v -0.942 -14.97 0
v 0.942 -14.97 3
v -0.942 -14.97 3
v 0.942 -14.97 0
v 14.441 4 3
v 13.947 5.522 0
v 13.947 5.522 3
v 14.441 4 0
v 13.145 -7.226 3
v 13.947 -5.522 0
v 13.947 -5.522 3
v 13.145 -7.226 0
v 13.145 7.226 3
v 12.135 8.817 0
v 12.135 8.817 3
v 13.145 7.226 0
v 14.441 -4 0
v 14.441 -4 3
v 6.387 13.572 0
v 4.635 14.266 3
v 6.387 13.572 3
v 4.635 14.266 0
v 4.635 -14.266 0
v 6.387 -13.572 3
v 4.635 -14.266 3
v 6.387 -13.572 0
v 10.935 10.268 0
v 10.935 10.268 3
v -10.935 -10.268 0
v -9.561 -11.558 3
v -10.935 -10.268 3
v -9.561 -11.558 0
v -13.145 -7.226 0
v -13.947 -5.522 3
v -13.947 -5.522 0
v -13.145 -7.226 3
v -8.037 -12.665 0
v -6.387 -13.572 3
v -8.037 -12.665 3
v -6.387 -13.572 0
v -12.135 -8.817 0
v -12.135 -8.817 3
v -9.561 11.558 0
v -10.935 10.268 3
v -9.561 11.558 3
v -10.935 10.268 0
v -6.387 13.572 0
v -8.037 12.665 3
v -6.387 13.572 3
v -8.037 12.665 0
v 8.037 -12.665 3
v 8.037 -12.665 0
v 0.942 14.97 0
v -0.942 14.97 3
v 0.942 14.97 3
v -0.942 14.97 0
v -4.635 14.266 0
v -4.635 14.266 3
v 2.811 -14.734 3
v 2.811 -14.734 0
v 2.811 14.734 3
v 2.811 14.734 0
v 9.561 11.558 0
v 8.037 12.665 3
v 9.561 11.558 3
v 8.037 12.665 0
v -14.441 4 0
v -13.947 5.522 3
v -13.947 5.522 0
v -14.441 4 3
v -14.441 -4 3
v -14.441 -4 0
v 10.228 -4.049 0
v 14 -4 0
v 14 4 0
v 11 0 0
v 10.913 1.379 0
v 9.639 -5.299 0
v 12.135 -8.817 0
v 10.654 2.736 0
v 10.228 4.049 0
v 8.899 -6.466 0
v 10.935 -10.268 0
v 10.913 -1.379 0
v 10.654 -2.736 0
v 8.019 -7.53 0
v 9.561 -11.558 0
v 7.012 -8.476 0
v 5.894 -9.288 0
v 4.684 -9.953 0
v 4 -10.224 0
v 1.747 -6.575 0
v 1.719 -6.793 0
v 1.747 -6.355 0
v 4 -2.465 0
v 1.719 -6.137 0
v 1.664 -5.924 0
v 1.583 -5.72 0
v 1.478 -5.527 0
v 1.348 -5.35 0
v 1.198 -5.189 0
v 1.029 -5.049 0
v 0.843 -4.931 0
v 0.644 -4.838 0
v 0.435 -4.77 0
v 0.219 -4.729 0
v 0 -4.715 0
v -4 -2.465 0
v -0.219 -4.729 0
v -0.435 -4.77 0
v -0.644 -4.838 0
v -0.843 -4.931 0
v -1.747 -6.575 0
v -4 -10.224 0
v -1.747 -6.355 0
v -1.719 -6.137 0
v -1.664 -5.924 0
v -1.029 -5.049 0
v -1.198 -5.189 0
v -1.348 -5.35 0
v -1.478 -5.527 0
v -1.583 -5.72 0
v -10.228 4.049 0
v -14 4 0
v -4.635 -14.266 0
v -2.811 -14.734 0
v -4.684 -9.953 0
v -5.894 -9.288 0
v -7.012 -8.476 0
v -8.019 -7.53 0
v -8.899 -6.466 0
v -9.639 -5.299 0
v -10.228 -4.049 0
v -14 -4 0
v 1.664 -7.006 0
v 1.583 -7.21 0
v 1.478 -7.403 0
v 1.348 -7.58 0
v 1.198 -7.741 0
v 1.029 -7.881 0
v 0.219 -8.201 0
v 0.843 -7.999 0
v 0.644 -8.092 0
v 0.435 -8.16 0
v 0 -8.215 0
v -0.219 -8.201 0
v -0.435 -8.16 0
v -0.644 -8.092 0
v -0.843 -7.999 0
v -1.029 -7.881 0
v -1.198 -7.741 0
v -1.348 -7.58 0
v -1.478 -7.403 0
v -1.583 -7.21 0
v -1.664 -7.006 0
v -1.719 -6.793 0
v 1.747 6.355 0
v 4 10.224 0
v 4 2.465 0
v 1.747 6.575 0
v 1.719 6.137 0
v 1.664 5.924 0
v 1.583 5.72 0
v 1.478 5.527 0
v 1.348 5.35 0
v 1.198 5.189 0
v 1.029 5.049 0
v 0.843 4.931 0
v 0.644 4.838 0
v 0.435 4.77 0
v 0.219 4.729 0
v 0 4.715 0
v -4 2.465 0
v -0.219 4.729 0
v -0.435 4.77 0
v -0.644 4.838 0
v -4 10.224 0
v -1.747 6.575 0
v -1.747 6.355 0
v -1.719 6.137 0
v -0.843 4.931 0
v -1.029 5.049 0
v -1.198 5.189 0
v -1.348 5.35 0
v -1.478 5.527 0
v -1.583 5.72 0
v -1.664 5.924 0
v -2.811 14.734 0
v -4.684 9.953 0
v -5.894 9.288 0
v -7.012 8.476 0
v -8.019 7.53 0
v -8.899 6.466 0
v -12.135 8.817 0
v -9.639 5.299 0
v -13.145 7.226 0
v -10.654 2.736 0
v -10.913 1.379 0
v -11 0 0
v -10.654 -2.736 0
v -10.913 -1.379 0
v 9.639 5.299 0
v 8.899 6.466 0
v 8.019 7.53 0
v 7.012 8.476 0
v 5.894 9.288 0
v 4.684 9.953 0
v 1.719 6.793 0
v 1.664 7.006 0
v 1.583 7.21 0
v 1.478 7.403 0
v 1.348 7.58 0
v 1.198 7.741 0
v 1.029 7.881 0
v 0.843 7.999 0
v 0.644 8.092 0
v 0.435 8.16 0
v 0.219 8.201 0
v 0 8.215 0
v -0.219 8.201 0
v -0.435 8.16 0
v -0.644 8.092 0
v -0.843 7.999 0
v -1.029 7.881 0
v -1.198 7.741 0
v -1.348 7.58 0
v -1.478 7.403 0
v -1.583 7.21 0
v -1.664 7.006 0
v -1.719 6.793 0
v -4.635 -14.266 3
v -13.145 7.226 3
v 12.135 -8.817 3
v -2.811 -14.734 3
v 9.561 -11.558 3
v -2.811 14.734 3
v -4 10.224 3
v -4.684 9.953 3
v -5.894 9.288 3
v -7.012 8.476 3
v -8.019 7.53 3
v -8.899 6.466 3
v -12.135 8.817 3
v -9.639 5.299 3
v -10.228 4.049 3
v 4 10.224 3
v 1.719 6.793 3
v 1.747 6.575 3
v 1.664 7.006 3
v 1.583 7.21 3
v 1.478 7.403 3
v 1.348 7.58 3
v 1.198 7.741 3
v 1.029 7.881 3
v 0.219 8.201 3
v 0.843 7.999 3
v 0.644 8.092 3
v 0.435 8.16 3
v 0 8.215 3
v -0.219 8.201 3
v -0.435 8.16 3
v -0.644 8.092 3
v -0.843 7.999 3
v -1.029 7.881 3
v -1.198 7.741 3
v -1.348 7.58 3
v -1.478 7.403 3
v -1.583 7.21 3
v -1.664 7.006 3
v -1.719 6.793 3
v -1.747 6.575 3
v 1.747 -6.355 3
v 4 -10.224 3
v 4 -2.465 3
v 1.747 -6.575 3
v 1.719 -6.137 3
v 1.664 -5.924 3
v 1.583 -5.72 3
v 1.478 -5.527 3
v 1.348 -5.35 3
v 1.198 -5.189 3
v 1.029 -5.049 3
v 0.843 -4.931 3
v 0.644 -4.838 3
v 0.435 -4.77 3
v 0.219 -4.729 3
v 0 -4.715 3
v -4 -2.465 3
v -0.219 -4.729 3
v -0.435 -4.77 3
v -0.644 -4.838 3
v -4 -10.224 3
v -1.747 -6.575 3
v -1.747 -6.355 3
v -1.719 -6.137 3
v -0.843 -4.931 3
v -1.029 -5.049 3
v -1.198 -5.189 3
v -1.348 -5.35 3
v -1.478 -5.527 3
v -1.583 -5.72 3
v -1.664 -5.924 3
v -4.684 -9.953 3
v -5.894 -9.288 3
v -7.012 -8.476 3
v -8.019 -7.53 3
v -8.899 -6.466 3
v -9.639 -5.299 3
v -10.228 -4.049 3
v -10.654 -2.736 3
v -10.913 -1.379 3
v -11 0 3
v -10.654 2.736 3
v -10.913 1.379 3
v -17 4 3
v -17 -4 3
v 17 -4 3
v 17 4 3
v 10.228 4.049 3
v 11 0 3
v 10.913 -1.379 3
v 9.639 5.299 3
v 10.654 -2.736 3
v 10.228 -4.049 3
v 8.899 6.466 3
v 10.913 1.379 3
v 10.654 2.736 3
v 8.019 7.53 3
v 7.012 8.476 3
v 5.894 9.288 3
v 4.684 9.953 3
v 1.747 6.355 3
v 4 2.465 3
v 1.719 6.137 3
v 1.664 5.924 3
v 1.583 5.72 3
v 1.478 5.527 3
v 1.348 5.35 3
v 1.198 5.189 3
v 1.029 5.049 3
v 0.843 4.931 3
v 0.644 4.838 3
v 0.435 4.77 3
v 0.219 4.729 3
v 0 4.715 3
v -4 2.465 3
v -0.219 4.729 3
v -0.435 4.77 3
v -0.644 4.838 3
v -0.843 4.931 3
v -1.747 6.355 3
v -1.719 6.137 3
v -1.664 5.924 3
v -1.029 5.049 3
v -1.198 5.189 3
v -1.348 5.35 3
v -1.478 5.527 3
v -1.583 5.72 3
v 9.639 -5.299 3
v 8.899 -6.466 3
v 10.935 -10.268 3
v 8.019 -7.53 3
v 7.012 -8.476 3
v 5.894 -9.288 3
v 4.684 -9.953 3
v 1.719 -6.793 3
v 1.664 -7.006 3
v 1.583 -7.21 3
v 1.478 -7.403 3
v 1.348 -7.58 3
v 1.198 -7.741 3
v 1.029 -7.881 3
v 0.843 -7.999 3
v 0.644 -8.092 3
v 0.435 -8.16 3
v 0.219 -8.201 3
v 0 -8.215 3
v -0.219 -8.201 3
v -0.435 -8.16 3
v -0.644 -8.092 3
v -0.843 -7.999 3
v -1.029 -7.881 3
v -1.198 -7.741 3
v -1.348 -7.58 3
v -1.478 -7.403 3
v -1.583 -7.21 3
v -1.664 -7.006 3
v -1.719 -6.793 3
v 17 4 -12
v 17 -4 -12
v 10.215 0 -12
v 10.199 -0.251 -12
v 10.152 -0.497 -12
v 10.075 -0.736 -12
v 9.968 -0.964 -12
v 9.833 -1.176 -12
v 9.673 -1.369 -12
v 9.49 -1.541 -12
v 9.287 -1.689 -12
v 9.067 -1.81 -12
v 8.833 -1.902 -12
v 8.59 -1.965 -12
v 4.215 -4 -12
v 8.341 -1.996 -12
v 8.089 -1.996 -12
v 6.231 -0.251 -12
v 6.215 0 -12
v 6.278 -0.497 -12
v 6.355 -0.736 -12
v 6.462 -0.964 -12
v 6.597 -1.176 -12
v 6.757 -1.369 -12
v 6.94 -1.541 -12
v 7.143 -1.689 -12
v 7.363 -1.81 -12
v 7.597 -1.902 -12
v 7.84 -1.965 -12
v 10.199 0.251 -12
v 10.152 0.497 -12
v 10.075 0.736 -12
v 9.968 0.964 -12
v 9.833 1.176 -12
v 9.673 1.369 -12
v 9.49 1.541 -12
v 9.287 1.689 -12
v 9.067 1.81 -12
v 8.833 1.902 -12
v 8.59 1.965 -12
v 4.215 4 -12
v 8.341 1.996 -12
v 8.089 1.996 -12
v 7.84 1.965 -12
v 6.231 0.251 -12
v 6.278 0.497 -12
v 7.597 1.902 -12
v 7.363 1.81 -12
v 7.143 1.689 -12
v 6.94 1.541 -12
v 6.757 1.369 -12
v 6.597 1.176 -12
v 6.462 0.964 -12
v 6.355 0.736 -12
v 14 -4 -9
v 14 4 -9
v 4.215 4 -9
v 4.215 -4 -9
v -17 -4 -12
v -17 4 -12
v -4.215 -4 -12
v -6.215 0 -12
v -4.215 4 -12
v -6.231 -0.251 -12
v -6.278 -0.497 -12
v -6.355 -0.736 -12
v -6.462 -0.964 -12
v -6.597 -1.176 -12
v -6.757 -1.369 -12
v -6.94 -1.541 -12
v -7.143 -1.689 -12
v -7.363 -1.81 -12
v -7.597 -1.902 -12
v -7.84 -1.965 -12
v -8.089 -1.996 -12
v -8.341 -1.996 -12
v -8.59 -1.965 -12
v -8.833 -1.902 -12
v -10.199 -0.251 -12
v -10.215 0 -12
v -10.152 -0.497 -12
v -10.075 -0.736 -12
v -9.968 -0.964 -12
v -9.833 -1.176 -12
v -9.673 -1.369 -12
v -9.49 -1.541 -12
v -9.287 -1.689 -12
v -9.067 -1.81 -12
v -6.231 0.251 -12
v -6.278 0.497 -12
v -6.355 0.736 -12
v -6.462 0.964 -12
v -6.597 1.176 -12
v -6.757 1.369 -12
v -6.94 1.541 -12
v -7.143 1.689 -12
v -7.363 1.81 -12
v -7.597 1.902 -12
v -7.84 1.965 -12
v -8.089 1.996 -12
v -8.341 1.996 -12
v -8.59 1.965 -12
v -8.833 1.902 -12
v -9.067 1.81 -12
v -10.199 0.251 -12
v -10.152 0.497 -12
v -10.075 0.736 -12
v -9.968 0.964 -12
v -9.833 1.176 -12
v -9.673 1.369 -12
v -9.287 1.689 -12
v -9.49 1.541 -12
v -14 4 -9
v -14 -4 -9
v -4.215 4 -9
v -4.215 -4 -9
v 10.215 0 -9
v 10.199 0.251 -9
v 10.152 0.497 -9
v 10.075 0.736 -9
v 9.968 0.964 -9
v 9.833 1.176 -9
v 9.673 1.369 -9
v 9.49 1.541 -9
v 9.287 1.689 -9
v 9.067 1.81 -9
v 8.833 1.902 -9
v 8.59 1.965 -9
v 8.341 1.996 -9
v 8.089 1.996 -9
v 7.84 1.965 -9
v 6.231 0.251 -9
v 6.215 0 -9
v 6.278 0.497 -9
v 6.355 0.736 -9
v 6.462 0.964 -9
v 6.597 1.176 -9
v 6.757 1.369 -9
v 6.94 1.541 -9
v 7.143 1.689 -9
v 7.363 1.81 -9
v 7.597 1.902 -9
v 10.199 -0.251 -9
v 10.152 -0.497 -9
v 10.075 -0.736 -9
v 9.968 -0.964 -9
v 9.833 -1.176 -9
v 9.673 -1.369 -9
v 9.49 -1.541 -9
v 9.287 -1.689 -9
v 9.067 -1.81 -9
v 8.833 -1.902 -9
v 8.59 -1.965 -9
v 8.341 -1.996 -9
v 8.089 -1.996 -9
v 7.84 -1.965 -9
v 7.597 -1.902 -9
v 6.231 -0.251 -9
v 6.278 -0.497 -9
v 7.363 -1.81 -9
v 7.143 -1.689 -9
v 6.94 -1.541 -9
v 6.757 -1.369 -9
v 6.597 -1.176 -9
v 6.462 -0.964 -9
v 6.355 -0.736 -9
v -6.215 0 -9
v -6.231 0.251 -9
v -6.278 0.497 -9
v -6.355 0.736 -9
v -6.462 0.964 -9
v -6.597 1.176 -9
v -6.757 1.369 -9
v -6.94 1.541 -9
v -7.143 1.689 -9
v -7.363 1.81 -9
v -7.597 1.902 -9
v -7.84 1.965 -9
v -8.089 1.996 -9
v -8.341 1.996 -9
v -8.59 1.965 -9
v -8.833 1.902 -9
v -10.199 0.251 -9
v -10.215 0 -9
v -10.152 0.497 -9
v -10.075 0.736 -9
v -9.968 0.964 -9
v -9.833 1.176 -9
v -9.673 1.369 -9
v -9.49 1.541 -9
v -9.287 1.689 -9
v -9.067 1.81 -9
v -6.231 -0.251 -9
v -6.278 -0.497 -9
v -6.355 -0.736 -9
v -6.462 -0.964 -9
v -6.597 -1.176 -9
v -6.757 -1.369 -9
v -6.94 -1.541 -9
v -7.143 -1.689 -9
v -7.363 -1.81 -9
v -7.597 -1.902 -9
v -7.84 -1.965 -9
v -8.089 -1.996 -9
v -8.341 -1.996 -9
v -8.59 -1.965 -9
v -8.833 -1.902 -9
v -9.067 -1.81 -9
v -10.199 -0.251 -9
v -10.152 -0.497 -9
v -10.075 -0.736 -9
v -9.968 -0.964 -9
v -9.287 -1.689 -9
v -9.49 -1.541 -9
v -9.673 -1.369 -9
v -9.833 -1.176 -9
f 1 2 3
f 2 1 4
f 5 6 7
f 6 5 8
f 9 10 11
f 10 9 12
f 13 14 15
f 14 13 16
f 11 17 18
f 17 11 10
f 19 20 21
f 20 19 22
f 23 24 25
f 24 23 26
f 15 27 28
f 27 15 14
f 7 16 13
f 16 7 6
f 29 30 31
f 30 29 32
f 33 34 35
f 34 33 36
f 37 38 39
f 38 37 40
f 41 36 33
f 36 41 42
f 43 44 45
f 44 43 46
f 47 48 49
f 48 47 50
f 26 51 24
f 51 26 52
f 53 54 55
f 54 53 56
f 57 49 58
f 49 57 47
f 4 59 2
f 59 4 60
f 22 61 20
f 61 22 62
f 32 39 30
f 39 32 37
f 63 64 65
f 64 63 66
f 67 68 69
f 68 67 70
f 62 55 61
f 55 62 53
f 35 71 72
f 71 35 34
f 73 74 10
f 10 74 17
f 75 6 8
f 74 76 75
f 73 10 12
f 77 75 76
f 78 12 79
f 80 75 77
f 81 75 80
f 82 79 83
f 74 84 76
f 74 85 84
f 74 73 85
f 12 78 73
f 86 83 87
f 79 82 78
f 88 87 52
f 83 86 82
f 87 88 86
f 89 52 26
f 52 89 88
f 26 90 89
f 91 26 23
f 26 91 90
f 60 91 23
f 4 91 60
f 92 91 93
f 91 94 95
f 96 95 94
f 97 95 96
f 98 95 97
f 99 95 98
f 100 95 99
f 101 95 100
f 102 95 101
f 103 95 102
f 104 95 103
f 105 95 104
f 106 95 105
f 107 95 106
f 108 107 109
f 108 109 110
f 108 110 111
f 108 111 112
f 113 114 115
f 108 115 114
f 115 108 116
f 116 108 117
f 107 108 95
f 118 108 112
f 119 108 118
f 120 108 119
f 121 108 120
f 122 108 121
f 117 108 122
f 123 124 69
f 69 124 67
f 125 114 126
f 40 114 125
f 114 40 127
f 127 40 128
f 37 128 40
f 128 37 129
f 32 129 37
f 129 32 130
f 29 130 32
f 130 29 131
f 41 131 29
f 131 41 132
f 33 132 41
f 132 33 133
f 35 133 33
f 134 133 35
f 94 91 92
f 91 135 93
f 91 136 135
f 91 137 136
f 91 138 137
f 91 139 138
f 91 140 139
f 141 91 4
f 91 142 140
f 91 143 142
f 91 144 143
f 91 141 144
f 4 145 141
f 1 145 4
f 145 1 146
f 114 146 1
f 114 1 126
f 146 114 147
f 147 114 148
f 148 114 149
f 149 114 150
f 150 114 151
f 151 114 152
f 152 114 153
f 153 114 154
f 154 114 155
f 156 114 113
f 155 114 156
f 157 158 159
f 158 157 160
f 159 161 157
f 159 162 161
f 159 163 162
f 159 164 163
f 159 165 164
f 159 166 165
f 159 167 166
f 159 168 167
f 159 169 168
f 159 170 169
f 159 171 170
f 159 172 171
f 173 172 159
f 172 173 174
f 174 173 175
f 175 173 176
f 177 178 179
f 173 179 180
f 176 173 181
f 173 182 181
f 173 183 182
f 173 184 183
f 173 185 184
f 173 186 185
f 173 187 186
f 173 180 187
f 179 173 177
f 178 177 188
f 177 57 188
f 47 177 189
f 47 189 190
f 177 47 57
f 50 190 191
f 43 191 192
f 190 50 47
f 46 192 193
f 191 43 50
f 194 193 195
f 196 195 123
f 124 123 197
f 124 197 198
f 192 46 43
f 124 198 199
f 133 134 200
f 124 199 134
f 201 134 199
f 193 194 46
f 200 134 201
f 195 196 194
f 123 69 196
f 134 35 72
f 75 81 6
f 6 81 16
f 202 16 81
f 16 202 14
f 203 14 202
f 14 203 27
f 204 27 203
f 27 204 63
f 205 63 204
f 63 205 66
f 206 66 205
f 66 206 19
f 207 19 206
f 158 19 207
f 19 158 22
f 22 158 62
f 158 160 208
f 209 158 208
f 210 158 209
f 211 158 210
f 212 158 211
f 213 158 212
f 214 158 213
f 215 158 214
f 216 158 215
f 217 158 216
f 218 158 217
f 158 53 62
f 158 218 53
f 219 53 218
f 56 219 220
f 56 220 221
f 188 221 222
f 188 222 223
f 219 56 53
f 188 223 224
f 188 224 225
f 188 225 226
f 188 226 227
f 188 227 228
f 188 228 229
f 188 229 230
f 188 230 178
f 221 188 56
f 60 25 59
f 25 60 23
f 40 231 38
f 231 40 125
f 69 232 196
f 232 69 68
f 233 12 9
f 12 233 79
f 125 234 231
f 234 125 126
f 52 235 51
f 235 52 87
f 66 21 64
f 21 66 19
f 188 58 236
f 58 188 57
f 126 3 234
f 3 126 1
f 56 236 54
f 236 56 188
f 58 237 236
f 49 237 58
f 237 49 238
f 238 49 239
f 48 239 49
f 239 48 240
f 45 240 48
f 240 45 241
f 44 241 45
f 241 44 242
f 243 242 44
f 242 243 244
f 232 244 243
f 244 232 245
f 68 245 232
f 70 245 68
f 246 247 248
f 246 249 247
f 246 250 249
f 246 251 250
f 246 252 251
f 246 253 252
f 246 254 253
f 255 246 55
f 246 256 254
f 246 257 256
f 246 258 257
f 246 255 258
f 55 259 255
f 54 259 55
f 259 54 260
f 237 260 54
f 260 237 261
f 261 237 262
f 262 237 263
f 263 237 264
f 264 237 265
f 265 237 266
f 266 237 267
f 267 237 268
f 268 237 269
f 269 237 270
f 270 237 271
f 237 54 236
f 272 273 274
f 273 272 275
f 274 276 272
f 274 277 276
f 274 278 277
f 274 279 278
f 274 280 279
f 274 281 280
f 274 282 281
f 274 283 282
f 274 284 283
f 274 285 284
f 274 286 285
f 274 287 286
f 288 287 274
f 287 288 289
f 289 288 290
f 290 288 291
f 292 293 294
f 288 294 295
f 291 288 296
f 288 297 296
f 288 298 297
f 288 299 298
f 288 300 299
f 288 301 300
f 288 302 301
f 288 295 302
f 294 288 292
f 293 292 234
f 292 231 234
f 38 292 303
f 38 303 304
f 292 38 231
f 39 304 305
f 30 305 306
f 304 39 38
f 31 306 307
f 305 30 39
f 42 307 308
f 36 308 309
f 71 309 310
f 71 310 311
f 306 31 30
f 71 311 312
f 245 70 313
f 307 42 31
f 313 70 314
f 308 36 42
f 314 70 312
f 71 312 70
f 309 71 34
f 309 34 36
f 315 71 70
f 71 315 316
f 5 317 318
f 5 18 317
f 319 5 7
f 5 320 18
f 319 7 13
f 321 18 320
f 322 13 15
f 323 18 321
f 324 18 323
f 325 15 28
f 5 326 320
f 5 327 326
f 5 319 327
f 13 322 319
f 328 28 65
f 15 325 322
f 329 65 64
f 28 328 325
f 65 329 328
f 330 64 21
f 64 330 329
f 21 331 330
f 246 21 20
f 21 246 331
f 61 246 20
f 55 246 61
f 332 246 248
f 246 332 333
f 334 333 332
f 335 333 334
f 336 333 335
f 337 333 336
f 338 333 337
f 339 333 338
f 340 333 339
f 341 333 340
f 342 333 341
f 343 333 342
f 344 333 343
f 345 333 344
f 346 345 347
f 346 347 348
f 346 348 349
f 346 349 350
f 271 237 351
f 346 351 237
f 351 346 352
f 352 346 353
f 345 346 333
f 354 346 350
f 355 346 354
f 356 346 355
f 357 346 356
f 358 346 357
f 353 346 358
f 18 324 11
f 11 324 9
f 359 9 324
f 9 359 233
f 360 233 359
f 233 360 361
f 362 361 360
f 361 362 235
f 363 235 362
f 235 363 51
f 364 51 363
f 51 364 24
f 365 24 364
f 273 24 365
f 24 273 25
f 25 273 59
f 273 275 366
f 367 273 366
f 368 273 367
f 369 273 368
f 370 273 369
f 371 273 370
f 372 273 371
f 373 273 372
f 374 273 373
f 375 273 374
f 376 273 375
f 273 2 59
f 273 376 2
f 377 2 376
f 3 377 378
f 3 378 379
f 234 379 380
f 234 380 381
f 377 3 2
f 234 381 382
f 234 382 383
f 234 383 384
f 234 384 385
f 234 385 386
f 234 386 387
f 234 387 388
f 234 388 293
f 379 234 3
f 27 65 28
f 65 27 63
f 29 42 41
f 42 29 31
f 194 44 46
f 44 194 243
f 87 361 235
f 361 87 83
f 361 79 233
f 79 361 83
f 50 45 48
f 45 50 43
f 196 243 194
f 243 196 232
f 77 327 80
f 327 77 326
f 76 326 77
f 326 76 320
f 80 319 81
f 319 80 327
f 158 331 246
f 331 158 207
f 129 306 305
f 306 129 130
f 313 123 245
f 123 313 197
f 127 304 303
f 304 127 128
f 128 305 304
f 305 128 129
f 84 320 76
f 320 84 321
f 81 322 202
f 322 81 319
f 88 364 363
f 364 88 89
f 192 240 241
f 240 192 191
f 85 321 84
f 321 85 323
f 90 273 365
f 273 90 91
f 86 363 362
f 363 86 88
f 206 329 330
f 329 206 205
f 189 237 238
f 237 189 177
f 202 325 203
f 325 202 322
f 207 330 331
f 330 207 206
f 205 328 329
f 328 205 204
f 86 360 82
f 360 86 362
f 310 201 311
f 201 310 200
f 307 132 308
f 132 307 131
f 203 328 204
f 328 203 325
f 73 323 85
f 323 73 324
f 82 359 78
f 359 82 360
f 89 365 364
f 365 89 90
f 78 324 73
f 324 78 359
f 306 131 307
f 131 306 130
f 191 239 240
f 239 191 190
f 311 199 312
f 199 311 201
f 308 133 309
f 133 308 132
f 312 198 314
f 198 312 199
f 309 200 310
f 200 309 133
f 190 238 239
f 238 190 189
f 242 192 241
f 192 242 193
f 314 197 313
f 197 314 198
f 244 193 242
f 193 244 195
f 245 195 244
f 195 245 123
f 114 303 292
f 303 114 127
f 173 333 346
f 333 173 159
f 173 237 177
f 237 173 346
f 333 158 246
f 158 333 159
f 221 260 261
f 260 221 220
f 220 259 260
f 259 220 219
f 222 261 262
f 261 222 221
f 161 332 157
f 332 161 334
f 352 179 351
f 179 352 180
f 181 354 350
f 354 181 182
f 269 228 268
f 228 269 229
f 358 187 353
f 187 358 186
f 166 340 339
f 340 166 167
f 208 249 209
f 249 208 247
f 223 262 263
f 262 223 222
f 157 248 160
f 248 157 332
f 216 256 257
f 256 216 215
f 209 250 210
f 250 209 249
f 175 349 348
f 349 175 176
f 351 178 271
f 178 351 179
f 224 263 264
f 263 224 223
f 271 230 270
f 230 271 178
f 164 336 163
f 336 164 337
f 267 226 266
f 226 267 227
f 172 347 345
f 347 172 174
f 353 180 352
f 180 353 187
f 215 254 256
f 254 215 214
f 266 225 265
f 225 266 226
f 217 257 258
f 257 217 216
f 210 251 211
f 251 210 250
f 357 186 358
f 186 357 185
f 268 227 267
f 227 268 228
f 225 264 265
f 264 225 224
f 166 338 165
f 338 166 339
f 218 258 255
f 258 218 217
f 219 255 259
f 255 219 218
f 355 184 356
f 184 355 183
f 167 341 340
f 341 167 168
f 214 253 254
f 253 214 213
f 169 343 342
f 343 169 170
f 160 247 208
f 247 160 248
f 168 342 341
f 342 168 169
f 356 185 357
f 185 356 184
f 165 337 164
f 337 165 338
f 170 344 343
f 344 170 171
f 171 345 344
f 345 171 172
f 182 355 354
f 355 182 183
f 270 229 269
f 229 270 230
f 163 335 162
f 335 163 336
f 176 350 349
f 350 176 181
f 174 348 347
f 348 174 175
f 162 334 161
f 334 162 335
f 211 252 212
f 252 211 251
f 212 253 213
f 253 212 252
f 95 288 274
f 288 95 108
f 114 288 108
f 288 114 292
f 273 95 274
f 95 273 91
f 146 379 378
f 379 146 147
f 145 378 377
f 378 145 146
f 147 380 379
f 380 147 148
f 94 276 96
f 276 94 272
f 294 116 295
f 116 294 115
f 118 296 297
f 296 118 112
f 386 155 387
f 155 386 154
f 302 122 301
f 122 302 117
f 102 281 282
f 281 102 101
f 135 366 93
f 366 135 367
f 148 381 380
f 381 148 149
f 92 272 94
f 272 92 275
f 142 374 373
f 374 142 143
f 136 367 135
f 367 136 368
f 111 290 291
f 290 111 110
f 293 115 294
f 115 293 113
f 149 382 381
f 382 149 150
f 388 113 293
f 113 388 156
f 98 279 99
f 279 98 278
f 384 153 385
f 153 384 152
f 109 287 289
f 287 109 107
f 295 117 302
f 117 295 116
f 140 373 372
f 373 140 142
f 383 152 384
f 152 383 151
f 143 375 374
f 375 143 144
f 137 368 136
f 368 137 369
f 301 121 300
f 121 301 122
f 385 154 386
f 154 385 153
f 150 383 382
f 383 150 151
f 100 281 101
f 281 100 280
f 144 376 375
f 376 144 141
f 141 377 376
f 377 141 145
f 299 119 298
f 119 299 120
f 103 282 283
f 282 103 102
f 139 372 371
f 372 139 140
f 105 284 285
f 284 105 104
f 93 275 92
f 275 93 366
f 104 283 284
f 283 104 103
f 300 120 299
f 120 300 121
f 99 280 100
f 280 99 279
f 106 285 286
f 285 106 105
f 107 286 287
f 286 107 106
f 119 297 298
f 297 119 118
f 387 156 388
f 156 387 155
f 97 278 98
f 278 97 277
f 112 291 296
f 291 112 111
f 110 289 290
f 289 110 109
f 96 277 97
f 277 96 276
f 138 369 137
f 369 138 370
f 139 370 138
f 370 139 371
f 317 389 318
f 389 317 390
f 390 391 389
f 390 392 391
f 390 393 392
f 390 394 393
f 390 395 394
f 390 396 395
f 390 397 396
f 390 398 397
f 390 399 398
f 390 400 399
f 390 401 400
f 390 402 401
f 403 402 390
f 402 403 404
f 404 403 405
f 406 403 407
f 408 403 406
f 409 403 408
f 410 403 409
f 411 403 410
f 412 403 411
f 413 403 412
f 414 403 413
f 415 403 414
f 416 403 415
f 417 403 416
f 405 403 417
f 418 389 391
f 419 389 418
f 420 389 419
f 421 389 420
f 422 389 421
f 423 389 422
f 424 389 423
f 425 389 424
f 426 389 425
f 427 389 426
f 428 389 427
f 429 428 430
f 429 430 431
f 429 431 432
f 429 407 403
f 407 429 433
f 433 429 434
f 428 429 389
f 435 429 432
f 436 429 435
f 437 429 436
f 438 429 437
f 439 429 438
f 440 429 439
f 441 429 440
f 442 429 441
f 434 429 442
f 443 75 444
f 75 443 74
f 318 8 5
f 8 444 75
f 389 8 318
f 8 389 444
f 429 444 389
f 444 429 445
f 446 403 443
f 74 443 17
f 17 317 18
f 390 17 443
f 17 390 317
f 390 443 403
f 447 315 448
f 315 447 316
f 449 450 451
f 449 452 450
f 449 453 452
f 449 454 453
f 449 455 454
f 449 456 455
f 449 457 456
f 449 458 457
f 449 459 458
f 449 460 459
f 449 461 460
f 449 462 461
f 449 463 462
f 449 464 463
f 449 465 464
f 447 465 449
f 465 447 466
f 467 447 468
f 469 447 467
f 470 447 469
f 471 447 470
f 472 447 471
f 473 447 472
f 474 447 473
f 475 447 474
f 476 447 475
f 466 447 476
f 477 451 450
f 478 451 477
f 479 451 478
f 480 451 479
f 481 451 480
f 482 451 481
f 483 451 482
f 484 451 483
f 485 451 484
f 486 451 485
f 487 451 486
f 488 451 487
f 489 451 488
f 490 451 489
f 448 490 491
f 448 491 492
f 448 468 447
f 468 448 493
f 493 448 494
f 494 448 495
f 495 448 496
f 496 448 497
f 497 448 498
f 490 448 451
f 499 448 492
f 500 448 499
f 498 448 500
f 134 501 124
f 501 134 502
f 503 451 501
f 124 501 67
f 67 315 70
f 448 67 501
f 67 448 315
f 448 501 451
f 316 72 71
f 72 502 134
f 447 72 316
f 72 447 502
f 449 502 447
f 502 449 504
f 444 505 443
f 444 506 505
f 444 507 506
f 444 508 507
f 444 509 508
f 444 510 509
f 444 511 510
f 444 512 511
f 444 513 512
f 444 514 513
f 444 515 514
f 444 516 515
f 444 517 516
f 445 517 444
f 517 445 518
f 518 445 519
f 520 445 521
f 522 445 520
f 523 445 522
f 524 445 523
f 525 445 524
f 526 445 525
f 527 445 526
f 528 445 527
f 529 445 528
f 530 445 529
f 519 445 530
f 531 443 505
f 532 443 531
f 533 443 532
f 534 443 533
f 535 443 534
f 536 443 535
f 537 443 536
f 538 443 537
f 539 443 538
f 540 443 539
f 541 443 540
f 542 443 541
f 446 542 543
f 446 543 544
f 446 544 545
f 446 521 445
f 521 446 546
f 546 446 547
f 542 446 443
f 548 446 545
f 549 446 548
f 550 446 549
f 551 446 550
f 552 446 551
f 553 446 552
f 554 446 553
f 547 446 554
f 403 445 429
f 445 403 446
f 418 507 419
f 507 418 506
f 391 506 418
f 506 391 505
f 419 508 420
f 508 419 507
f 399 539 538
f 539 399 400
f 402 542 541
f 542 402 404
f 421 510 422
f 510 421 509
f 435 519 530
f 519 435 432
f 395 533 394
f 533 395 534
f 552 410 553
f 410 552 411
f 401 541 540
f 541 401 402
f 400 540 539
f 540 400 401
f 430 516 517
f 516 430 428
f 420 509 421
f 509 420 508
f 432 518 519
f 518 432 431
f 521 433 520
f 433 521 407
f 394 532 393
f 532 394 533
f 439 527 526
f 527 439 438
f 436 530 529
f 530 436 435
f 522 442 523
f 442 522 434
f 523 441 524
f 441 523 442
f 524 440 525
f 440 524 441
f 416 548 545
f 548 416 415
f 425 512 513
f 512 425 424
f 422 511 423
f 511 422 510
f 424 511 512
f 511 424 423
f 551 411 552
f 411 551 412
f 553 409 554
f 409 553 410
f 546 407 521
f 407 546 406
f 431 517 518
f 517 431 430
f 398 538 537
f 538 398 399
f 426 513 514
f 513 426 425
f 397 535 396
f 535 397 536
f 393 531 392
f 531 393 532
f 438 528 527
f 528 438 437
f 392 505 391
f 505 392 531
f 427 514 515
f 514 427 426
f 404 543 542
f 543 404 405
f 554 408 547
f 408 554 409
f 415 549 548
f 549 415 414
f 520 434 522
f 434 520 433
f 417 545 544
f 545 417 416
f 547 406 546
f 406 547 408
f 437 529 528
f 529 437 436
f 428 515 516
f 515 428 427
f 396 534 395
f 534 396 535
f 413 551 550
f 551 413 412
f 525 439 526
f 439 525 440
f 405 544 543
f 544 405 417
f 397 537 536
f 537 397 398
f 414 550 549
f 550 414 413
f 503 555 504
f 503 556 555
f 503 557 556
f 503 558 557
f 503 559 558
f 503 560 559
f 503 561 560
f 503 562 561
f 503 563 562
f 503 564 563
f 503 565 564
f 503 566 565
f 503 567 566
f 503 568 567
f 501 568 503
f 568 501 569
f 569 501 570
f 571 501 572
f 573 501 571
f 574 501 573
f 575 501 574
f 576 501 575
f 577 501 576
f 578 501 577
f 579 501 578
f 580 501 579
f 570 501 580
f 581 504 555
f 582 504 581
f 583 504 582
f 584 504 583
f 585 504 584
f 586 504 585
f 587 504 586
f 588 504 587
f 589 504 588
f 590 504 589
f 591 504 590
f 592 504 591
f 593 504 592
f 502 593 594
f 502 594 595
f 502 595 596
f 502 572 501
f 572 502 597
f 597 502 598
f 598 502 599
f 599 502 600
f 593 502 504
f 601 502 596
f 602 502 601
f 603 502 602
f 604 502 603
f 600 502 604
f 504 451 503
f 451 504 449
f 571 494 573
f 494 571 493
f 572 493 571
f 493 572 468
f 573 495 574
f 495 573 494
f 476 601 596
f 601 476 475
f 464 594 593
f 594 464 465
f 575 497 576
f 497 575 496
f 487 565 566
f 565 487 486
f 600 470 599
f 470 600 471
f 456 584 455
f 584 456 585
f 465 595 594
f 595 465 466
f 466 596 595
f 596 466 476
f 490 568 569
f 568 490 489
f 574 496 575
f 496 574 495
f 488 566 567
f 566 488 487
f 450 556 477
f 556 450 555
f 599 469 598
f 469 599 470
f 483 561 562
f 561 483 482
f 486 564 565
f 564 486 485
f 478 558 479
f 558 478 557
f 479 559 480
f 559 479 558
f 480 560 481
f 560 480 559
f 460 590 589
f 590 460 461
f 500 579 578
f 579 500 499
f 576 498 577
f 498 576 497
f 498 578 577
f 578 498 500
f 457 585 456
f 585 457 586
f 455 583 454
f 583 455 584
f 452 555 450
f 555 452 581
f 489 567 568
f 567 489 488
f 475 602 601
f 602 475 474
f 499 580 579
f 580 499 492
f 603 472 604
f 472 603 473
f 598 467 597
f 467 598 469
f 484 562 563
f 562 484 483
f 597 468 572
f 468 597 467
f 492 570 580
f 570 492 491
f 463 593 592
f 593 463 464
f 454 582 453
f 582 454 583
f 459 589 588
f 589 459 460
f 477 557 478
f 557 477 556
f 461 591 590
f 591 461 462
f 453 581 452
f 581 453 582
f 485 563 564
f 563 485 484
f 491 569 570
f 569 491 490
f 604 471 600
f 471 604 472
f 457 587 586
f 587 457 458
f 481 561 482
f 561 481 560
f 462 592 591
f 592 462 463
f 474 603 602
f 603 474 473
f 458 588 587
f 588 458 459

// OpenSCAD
//Base adapter for different G9 Sockets
//by: Brett Mattas
//date: February 24, 2018
//units: mm
//description:
//G9 Sockets I bought for lithophane lamp:
//https://www.thingiverse.com/thing:2656745
//don't fit on this base. Also have wires coming out
//of the bottom. This is an adapter bracket.
//version 2.0:
//Changed to make more customizable

/////////////////////////////////////////////
/////////  PARAMETERS ///////////////////////
/////////////////////////////////////////////


//Overall
Thickness = 3; //Disc, arm and tab thickness
Height = 15; //Height
TabWidth = 8; //Tab side dimension

//Top disc
TopOutD = 30; //Top disc outside diamter
TopInD = 22; //Top disc inside diamter

//Top Tabs
TopHoleD = 3.5; //Hole diameter for light socket screws
TopHoleS = 12.93; //Spacing of top holes

//Vertical arms
VertArmOut = 28; //Out-out dimension of the vertical arms

//Bottom tabs
BotHoleD = 4; //Bottom hole diameter
BotHoleS = 16.43; //Bottom hole spacing

//Global Parameters
Global_Scale = 1;
$fn = 50;
EPS = 0.01; //Small number to avoid coincident faces



/////////////////////////////////////////////
/////////  RENDERS //////////////////////////
/////////////////////////////////////////////

//Driver

scale(Global_Scale){

    Bracket();

}
/////////////////////////////////////////////
/////////  FUNCTIONS ////////////////////////
/////////////////////////////////////////////





/////////////////////////////////////////////
/////////  MODULES //////////////////////////
/////////////////////////////////////////////


//Main Module
module Bracket()
{
    
    //Elements added
    union(){
    
        //Top cylinder
        Disc(TopOutD, TopInD, Thickness);
        
        //Top hole tabs
        rotate([0, 0, 90]){
            TopTab(TopOutD, TopInD, TopHoleS, TabWidth, Thickness, TopHoleD);
            mirror([1, 0, 0])
                TopTab(TopOutD, TopInD, TopHoleS, TabWidth, Thickness, TopHoleD);
        }
        
        //Vertical arms
        TabArm(TopInD, VertArmOut, TabWidth, Thickness, Height);
        mirror([1, 0, 0])
            TabArm(TopInD, VertArmOut, TabWidth, Thickness, Height);
        
        //Bottom tabs
        BotTab(VertArmOut, BotHoleS, TabWidth, Thickness, Height, BotHoleD);
        mirror([1, 0, 0])
            BotTab(VertArmOut, BotHoleS, TabWidth, Thickness, Height, BotHoleD);
        
    }
        
        
}


module Disc(OutD, InD, T){
    //Hollow disc
    difference(){
        cylinder(r=OutD/2, h=T, center=false);
        translate([0, 0, -EPS])
            cylinder(r=InD/2, h=T+2*EPS, center=false);
    }
}


module TabArm(In, Out, W, T, H){
    //Arm for tabs
    //Should be outside of the inside D
    union(){
        translate([Out/2, -W/2, -H+T])
            cube([T, W, H], center=false);
        translate([In/2, -W/2, 0])
            cube([(Out-In)/2, W, T], center=false);
    }
}


module BotTab(Out, HoleS, W, T, H, HoleD){
    //Bottom tab
    if(HoleS > Out){
        //Holes are outside the vertical tab
        difference(){
            translate([Out/2, -W/2, -H+T])
                cube([(HoleS/2 + W/2 - Out/2), W, T], center=false);
            translate([HoleS/2, 0, -H+T-EPS])
                cylinder(r=HoleD/2, h=T+2*EPS, center=false);
        }
    } else {
        //Holes are inside the vertical tab
        difference(){
            translate([HoleS/2-W/2, -W/2, -H+T])
                cube([(Out/2 - HoleS/2 + W/2 + T), W, T], center=false);
            translate([HoleS/2, 0, -H+T-EPS])
                cylinder(r=HoleD/2, h=T+2*EPS, center=false);
        }
    }
    
}

module TopTab(Out, In, HoleS, W, T, HoleD){
    //Top tabs
    if(HoleS > Out){
        //Holes are outside the vertical tab
        difference(){
            translate([In/2, -W/2, 0])
                cube([(HoleS/2 + W/2 - In/2), W, T], center=false);
            translate([HoleS/2, 0, -EPS])
                cylinder(r=HoleD/2, h=T+2*EPS, center=false);
        }
    } else {
        //Holes are inside the vertical tab
        difference(){
            translate([HoleS/2-W/2, -W/2, 0])
                cube([(In/2 - HoleS/2 + W/2), W, T], center=false);
            translate([HoleS/2, 0, -EPS])
                cylinder(r=HoleD/2, h=T+2*EPS, center=false);
        }
    }
}
